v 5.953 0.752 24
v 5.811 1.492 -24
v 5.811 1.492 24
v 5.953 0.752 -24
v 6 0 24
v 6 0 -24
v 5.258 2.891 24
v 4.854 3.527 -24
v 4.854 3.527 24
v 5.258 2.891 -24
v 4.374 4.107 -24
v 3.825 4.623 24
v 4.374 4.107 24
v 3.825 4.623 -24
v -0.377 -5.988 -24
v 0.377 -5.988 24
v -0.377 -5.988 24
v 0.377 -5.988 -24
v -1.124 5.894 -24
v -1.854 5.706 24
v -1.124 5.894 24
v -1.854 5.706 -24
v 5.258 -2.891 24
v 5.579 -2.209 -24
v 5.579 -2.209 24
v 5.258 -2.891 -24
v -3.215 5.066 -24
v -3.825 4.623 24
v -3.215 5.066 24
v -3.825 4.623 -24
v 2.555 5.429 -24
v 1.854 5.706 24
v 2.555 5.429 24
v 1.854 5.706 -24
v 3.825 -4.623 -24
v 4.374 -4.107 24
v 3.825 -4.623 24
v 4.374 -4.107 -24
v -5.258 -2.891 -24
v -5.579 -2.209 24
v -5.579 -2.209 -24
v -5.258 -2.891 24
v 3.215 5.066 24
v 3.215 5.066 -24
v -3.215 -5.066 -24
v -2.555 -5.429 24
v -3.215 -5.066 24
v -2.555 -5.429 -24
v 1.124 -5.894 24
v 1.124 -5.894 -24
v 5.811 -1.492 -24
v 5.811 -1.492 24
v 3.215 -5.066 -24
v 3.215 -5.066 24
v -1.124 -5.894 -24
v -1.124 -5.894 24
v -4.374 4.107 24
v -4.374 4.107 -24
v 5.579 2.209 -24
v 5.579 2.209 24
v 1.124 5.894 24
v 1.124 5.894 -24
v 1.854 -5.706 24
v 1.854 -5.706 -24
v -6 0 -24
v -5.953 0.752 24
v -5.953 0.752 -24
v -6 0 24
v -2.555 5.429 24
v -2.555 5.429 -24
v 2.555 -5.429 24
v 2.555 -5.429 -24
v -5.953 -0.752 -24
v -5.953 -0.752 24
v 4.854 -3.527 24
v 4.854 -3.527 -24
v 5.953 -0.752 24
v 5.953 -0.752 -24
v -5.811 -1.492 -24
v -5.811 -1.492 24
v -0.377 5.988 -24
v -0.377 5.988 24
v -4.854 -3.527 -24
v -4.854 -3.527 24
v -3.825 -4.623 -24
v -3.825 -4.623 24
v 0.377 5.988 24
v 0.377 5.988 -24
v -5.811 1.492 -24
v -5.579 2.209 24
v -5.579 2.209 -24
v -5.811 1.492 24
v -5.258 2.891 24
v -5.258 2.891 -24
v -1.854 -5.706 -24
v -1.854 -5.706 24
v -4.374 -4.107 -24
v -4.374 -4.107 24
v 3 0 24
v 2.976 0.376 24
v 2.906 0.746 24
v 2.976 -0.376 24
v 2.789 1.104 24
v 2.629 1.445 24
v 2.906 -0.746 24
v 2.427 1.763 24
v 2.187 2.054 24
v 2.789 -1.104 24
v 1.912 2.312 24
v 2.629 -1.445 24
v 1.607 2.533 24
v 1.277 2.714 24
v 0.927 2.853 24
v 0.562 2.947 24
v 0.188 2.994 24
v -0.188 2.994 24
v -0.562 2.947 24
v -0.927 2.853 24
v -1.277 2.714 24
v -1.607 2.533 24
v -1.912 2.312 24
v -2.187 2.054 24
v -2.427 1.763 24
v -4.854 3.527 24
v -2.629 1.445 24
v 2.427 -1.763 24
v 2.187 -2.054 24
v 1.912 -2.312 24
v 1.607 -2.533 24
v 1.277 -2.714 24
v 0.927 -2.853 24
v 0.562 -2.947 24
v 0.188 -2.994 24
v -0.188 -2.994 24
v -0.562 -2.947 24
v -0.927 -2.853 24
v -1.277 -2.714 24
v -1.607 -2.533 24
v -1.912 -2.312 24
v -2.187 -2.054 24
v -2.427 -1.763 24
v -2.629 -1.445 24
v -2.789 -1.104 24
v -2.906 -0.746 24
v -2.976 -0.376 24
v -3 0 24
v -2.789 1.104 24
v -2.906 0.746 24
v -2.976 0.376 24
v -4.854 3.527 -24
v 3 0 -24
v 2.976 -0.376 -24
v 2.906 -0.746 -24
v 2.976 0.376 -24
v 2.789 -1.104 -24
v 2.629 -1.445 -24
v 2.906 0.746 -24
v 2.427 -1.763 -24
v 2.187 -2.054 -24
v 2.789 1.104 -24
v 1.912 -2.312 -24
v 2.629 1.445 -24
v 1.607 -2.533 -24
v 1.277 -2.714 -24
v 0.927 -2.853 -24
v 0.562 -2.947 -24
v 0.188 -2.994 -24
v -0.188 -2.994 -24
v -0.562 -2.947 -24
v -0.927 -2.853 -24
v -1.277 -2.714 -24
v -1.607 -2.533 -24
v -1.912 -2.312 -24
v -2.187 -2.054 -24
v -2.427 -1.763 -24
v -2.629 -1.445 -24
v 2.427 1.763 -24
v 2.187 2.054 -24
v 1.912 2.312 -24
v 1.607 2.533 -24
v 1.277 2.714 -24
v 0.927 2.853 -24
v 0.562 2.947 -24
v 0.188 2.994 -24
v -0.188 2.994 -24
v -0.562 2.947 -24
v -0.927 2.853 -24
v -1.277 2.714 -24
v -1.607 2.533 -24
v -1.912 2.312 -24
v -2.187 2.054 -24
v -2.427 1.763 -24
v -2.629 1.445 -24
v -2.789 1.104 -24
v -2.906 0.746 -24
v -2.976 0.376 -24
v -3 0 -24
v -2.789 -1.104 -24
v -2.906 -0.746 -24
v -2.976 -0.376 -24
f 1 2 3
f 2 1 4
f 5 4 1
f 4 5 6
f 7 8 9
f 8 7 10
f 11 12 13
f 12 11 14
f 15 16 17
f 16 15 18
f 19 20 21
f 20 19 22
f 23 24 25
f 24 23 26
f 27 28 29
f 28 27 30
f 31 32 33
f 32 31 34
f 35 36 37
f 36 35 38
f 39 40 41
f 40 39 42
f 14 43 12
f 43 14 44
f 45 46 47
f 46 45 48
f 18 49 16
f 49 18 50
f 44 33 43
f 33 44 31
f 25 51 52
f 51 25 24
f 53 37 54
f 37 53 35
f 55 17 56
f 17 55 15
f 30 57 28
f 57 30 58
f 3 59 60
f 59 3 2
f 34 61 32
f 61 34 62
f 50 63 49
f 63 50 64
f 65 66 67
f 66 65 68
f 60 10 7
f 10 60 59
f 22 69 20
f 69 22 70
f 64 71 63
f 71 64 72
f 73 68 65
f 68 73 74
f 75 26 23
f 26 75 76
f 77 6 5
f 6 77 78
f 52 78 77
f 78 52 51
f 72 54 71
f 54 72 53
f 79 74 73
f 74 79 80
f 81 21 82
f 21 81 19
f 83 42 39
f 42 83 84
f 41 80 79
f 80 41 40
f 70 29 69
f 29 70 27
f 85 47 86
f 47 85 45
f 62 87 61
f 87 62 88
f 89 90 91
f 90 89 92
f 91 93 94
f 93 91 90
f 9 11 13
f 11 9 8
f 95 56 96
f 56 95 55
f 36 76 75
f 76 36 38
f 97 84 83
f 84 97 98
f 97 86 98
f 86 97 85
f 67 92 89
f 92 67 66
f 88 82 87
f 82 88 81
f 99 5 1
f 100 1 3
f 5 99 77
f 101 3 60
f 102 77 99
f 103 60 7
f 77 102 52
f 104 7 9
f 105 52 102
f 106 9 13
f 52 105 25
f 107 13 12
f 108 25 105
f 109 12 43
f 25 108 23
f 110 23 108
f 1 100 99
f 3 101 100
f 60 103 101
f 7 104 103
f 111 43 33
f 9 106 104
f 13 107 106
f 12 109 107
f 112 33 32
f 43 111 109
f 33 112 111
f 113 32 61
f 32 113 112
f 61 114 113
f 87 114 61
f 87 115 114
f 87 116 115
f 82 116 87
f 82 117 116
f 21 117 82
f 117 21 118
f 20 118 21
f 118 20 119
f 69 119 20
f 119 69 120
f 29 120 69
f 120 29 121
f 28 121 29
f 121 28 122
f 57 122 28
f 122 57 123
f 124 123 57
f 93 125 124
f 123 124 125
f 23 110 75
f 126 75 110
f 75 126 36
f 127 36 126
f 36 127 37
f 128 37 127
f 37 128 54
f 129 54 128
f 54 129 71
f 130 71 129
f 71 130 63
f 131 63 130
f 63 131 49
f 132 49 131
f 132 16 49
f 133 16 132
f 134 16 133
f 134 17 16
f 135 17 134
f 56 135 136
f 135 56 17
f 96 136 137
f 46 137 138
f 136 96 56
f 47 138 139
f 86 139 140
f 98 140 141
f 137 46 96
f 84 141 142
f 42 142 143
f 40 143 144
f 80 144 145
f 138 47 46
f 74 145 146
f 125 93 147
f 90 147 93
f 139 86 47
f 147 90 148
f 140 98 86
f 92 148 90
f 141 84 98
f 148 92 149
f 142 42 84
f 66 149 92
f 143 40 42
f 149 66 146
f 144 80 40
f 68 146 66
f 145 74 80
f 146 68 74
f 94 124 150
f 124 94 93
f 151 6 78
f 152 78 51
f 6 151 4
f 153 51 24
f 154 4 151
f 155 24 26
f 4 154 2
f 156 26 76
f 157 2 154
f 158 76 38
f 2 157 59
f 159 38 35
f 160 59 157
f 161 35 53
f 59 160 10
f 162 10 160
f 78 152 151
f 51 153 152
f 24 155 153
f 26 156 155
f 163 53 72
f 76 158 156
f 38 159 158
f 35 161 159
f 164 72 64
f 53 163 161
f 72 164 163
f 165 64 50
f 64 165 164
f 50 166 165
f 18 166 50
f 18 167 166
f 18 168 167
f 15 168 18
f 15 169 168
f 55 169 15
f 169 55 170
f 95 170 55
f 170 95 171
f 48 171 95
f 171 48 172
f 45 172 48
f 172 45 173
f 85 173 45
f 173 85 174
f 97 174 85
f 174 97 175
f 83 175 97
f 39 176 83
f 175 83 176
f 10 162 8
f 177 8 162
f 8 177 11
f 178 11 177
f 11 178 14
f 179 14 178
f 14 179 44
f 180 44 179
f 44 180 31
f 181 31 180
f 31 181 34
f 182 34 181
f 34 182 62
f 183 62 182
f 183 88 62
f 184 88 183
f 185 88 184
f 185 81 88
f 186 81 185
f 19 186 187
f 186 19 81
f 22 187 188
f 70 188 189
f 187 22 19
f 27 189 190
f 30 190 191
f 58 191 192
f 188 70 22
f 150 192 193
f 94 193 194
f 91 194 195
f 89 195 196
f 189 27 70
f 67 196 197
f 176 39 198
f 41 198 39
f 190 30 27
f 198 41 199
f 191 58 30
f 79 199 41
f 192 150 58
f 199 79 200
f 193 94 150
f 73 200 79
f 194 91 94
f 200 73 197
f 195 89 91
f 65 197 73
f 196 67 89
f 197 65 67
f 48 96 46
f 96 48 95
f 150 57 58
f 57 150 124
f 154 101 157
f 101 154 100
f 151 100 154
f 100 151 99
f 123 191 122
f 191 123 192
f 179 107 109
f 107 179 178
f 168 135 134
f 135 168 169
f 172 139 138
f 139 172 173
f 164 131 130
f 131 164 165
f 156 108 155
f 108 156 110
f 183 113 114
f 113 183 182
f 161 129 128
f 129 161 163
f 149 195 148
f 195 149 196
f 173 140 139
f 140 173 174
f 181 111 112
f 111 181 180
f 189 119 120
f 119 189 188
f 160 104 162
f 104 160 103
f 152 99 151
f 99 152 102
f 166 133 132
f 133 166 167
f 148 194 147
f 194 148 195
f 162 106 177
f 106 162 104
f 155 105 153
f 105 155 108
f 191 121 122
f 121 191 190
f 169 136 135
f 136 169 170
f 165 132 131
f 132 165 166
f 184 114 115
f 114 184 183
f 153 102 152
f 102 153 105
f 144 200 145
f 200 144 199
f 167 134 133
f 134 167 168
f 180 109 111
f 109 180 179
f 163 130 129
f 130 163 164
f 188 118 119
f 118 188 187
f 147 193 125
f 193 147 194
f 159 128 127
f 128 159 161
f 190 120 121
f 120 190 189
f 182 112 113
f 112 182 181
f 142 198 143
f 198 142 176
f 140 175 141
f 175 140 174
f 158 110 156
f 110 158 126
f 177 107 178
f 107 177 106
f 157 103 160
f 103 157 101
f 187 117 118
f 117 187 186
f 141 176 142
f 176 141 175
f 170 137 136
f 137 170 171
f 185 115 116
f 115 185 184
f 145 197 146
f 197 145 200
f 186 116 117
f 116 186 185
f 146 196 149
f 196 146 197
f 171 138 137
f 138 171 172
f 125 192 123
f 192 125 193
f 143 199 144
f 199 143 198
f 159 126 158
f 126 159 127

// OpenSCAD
$fn = 50;


difference() {
	union() {
		translate(v = [0, 0, -24.0000000000]) {
			cylinder(h = 48, r = 6.0000000000);
		}
	}
	union() {
		translate(v = [0, 0, -100.0000000000]) {
			cylinder(h = 200, r = 3.0000000000);
		}
	}
}
